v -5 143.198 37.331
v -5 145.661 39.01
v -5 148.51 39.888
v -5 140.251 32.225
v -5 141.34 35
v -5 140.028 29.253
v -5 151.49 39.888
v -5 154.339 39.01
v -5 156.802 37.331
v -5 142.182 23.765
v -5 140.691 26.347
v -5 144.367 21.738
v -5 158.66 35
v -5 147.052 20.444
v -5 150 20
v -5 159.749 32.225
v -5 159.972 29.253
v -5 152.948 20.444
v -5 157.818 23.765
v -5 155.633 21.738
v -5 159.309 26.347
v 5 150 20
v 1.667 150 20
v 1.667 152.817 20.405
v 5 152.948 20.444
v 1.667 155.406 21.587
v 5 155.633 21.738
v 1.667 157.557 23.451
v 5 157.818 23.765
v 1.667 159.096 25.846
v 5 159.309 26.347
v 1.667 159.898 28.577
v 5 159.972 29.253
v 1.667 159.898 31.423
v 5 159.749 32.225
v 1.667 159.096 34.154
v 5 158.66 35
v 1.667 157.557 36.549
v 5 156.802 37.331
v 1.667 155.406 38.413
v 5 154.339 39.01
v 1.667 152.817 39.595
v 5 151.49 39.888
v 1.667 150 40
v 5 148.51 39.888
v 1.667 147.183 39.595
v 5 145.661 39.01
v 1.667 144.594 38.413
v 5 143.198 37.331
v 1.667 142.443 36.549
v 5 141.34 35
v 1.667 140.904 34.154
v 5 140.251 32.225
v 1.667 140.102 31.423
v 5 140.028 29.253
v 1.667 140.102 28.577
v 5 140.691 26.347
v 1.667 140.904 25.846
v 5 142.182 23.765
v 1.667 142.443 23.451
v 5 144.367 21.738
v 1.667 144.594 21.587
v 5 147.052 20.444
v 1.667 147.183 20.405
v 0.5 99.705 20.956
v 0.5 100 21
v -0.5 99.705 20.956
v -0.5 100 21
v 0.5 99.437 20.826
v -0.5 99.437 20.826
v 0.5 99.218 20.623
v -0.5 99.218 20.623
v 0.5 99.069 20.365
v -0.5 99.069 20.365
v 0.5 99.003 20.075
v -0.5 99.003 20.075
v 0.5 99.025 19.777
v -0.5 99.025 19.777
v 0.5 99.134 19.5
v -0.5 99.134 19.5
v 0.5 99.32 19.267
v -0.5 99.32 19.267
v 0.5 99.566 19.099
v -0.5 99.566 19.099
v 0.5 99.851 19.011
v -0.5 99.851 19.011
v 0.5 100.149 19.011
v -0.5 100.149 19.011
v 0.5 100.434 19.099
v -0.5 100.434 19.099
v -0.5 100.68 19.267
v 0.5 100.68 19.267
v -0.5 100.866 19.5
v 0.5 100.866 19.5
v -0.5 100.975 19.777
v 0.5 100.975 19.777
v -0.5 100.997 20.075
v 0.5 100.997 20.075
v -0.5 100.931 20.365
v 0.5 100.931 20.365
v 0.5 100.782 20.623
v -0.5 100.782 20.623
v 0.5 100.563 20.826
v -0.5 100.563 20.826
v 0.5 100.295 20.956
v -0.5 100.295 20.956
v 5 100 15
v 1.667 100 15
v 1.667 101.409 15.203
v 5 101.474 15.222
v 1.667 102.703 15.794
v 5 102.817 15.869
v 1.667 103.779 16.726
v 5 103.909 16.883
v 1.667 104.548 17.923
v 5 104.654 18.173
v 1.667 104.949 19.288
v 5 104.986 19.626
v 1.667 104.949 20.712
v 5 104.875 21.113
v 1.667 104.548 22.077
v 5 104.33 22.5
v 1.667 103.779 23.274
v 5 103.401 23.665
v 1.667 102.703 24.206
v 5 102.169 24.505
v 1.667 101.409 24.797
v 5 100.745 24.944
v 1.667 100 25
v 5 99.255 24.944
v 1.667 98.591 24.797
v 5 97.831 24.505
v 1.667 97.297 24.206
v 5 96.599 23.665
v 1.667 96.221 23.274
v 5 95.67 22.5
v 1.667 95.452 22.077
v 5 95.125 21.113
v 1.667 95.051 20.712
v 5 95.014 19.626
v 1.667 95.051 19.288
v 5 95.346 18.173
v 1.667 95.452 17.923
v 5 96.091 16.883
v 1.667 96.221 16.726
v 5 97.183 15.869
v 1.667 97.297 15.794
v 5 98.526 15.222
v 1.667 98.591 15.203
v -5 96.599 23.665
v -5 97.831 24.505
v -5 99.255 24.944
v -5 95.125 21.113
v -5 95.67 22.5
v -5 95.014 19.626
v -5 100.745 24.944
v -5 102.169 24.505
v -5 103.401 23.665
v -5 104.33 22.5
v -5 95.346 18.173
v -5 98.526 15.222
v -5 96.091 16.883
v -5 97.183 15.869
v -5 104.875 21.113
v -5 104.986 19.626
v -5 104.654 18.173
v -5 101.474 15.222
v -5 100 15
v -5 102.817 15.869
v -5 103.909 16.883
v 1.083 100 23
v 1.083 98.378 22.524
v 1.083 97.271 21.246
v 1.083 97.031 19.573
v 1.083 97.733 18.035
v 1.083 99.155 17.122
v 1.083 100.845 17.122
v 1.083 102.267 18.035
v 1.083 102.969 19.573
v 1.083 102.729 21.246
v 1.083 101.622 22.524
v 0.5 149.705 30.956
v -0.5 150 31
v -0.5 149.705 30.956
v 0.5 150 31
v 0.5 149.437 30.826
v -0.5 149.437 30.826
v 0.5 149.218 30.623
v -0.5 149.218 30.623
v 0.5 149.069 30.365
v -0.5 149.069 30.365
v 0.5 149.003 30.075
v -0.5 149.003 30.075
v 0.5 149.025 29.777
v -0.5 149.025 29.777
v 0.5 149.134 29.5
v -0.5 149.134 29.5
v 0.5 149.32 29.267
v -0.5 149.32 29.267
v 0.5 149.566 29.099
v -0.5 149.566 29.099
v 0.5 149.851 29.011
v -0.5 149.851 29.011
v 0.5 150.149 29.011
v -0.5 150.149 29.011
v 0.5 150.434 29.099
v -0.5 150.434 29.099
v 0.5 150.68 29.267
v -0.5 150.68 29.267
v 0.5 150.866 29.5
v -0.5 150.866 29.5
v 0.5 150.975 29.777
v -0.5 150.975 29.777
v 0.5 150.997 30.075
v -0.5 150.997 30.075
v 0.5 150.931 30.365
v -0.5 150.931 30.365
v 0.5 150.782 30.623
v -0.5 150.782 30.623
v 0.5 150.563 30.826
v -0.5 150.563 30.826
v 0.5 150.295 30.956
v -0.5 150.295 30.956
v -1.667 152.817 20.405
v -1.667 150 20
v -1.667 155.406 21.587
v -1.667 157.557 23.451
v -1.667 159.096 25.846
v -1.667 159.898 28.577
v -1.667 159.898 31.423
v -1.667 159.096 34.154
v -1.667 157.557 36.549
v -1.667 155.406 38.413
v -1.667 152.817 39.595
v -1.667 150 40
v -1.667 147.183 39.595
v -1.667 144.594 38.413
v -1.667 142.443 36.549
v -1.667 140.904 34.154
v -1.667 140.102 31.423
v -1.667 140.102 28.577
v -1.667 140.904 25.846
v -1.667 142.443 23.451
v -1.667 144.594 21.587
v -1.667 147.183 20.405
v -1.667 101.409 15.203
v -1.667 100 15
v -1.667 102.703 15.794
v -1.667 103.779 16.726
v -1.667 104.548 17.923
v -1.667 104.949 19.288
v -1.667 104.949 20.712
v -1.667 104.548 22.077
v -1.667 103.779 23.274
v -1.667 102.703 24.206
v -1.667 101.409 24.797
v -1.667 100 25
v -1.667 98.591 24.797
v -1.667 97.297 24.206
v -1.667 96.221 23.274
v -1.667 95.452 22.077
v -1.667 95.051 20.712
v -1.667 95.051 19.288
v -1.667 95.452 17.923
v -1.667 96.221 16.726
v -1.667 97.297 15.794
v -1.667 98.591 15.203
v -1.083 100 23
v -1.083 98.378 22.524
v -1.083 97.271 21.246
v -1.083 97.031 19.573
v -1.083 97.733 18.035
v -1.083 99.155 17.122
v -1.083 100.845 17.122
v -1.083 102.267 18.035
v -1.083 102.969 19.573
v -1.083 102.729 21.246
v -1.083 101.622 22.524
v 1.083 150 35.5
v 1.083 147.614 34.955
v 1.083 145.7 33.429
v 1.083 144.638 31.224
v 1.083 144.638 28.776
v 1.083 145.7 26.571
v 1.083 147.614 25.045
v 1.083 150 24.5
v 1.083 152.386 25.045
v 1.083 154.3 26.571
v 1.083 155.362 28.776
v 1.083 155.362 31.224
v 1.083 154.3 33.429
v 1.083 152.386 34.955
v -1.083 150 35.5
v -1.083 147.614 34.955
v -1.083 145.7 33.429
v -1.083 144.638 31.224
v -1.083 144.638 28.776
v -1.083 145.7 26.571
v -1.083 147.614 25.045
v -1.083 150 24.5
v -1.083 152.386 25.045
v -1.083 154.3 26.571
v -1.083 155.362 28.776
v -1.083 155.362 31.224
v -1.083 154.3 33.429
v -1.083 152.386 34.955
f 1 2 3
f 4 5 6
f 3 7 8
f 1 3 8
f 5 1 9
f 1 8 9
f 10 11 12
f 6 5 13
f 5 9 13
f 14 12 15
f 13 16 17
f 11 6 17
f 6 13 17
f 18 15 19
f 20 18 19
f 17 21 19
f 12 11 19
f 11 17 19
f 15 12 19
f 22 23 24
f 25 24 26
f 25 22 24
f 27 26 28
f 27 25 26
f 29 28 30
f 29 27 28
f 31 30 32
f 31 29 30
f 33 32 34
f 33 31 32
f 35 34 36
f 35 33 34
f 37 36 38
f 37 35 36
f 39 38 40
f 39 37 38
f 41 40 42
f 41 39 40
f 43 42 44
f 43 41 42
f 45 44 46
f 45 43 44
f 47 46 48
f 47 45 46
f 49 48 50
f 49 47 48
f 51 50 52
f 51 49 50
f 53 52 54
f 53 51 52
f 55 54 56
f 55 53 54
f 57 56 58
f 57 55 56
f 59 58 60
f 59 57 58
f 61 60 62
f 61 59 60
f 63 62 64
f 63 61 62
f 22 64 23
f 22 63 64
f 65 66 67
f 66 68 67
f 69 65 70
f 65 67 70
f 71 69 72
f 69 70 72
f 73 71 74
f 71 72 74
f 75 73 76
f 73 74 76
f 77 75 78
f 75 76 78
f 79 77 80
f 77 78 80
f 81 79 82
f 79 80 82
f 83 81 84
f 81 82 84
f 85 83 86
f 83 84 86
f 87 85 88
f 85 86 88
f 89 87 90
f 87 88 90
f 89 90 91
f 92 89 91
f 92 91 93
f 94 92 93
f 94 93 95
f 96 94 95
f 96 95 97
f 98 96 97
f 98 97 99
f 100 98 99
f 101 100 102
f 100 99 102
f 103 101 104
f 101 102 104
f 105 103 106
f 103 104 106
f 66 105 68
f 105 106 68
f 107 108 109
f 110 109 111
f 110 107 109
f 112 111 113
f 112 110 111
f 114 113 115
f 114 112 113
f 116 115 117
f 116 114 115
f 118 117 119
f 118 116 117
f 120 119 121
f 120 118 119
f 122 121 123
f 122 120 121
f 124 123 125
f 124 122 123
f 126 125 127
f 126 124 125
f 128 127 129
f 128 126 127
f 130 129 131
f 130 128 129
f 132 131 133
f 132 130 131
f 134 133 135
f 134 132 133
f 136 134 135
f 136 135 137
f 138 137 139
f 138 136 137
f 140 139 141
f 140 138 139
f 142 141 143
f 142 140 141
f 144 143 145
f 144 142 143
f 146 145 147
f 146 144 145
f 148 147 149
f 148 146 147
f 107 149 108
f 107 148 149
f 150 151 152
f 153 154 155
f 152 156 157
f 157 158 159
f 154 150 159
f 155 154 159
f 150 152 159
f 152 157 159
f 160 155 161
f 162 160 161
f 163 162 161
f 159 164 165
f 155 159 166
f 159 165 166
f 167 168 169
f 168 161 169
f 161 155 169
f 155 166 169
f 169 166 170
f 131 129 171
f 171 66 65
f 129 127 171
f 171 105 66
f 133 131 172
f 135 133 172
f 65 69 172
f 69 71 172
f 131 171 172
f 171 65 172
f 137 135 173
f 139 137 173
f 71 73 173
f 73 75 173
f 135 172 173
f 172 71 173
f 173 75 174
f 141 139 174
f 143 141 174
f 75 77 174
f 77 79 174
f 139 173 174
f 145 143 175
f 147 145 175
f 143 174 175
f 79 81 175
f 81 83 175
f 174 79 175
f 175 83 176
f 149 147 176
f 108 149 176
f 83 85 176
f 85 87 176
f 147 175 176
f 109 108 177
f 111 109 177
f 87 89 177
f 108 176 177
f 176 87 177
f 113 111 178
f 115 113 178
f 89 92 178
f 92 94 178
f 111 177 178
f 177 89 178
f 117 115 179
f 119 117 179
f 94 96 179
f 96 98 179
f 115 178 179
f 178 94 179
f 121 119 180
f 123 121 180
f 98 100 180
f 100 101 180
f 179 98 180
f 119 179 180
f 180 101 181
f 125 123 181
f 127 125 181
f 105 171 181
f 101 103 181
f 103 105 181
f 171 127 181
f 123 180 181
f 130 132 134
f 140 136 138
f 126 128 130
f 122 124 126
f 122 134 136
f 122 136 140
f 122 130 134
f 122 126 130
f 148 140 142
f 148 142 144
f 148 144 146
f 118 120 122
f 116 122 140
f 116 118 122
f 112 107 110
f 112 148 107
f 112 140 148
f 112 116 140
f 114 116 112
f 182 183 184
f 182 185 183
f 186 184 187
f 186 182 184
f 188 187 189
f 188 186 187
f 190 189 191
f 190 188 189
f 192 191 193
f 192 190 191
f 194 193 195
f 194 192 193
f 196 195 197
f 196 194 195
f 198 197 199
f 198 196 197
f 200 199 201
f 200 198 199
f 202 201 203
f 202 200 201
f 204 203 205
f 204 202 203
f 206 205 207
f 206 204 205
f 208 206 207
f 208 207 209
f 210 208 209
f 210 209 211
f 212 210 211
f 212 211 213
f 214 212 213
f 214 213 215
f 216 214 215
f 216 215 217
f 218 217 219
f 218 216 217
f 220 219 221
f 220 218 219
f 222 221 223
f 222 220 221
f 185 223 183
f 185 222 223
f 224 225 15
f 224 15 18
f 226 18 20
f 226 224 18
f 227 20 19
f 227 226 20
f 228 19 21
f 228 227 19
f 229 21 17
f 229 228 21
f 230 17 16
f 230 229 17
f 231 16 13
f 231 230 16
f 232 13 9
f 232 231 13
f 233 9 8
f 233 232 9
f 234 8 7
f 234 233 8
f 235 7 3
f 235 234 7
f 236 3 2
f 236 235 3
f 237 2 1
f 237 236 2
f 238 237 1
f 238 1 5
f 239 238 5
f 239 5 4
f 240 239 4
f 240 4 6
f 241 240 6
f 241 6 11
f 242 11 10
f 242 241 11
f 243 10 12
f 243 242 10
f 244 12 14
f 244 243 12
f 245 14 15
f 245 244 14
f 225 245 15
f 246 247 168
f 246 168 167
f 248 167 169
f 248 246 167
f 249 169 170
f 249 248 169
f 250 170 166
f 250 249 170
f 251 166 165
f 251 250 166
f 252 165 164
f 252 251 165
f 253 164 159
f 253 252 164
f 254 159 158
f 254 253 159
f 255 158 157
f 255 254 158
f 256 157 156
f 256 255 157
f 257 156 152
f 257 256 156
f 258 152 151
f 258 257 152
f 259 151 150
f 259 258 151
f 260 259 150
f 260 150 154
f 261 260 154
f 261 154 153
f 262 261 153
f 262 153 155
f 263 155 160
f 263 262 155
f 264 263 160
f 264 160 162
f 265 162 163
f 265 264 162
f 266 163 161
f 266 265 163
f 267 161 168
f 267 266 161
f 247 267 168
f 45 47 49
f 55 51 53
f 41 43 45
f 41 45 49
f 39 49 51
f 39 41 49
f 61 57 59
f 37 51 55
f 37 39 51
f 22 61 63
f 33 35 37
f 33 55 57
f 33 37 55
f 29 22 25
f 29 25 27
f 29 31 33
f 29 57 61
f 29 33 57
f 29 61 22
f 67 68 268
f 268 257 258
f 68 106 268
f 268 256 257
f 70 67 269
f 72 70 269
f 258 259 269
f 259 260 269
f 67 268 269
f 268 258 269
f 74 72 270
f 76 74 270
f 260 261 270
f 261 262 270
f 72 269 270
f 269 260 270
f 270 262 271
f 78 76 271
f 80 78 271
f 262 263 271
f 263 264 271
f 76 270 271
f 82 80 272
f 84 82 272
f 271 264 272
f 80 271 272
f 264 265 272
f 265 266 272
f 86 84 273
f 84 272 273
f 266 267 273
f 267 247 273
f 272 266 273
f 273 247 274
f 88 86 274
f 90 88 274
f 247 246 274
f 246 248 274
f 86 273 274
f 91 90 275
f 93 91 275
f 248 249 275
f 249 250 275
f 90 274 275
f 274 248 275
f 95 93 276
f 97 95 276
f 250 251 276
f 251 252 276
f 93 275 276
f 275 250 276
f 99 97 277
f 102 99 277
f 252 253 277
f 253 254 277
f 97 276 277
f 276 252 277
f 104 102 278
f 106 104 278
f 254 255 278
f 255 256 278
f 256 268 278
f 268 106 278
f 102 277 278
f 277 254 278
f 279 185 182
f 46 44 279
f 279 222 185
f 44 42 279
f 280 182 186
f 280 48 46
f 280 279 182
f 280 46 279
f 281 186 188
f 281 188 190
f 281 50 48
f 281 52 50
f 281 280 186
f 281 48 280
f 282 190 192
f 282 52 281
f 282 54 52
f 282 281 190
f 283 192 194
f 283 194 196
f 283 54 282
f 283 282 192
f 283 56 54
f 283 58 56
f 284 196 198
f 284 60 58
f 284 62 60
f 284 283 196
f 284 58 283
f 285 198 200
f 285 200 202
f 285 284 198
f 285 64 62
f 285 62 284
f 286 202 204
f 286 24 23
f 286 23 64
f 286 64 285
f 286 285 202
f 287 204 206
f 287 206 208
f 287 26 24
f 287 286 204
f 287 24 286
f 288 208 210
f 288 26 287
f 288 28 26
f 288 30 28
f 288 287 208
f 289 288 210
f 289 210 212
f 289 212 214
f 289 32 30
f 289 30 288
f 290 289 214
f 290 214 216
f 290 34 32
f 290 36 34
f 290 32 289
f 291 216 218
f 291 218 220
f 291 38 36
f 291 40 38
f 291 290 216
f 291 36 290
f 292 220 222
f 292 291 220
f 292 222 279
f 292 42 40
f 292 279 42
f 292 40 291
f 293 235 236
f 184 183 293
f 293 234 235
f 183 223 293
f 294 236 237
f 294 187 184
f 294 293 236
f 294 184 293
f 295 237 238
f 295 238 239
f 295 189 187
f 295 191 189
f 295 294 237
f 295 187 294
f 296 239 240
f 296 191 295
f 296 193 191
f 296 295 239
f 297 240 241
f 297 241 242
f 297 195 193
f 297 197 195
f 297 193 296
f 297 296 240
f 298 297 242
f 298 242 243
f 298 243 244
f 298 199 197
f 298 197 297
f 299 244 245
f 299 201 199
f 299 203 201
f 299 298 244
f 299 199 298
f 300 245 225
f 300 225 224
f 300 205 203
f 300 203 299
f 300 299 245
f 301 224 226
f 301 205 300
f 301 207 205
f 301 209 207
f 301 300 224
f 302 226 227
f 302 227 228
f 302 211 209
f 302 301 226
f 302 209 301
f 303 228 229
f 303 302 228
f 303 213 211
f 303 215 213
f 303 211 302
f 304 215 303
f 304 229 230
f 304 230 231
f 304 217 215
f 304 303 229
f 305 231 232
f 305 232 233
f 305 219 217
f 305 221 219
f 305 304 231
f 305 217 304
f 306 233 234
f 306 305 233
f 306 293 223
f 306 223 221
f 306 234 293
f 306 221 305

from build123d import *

# Parameters (mm, degrees)
SKETCH1_R             = 10
BOSS_EXTRUDE1_DEPTH   = 5
SKETCH1_R_2           = 5
BOSS_EXTRUDE1_2_DEPTH = 5


with BuildPart() as part:
    # Sketch1 → Boss-Extrude1 (new, symmetric)
    with BuildSketch(Plane(origin=(0, 0, 0), x_dir=(0, 0, -1), z_dir=(1, 0, 0))):
        with Locations((-30, 150)):
            Circle(SKETCH1_R)
    extrude(amount=BOSS_EXTRUDE1_DEPTH, both=True)

    # Sketch3 → Cut-Revolve4 (revolve, cut)
    with BuildSketch(Plane.XY.offset(30), mode=Mode.PRIVATE) as cut_revolve4_sk:
        Polygon((1.666666667, 160), (-1.666666667, 160), (-0.5, 151), (0.5, 151), align=None)
    revolve(cut_revolve4_sk.sketch.rotate(Axis((-5, 150, 30), (1, 0, 0)), 90), axis=Axis((-5, 150, 30), (1, 0, 0)), mode=Mode.SUBTRACT)


with BuildPart() as body_2:
    # Sketch1 → Boss-Extrude1 2 (new, symmetric)
    with BuildSketch(Plane(origin=(0, 0, 0), x_dir=(0, 0, -1), z_dir=(1, 0, 0))):
        with Locations((-20, 100)):
            Circle(SKETCH1_R_2)
    extrude(amount=BOSS_EXTRUDE1_2_DEPTH, both=True)

    # Sketch2 → Cut-Revolve3 (revolve, cut)
    with BuildSketch(Plane.XY.offset(20), mode=Mode.PRIVATE) as cut_revolve3_sk:
        Polygon((0.5, 101), (-0.5, 101), (-1.666666667, 105), (1.666666667, 105), align=None)
    revolve(cut_revolve3_sk.sketch.rotate(Axis((-5, 100, 20), (1, 0, 0)), 90), axis=Axis((-5, 100, 20), (1, 0, 0)), mode=Mode.SUBTRACT)


solid = Compound([part.part, body_2.part])
